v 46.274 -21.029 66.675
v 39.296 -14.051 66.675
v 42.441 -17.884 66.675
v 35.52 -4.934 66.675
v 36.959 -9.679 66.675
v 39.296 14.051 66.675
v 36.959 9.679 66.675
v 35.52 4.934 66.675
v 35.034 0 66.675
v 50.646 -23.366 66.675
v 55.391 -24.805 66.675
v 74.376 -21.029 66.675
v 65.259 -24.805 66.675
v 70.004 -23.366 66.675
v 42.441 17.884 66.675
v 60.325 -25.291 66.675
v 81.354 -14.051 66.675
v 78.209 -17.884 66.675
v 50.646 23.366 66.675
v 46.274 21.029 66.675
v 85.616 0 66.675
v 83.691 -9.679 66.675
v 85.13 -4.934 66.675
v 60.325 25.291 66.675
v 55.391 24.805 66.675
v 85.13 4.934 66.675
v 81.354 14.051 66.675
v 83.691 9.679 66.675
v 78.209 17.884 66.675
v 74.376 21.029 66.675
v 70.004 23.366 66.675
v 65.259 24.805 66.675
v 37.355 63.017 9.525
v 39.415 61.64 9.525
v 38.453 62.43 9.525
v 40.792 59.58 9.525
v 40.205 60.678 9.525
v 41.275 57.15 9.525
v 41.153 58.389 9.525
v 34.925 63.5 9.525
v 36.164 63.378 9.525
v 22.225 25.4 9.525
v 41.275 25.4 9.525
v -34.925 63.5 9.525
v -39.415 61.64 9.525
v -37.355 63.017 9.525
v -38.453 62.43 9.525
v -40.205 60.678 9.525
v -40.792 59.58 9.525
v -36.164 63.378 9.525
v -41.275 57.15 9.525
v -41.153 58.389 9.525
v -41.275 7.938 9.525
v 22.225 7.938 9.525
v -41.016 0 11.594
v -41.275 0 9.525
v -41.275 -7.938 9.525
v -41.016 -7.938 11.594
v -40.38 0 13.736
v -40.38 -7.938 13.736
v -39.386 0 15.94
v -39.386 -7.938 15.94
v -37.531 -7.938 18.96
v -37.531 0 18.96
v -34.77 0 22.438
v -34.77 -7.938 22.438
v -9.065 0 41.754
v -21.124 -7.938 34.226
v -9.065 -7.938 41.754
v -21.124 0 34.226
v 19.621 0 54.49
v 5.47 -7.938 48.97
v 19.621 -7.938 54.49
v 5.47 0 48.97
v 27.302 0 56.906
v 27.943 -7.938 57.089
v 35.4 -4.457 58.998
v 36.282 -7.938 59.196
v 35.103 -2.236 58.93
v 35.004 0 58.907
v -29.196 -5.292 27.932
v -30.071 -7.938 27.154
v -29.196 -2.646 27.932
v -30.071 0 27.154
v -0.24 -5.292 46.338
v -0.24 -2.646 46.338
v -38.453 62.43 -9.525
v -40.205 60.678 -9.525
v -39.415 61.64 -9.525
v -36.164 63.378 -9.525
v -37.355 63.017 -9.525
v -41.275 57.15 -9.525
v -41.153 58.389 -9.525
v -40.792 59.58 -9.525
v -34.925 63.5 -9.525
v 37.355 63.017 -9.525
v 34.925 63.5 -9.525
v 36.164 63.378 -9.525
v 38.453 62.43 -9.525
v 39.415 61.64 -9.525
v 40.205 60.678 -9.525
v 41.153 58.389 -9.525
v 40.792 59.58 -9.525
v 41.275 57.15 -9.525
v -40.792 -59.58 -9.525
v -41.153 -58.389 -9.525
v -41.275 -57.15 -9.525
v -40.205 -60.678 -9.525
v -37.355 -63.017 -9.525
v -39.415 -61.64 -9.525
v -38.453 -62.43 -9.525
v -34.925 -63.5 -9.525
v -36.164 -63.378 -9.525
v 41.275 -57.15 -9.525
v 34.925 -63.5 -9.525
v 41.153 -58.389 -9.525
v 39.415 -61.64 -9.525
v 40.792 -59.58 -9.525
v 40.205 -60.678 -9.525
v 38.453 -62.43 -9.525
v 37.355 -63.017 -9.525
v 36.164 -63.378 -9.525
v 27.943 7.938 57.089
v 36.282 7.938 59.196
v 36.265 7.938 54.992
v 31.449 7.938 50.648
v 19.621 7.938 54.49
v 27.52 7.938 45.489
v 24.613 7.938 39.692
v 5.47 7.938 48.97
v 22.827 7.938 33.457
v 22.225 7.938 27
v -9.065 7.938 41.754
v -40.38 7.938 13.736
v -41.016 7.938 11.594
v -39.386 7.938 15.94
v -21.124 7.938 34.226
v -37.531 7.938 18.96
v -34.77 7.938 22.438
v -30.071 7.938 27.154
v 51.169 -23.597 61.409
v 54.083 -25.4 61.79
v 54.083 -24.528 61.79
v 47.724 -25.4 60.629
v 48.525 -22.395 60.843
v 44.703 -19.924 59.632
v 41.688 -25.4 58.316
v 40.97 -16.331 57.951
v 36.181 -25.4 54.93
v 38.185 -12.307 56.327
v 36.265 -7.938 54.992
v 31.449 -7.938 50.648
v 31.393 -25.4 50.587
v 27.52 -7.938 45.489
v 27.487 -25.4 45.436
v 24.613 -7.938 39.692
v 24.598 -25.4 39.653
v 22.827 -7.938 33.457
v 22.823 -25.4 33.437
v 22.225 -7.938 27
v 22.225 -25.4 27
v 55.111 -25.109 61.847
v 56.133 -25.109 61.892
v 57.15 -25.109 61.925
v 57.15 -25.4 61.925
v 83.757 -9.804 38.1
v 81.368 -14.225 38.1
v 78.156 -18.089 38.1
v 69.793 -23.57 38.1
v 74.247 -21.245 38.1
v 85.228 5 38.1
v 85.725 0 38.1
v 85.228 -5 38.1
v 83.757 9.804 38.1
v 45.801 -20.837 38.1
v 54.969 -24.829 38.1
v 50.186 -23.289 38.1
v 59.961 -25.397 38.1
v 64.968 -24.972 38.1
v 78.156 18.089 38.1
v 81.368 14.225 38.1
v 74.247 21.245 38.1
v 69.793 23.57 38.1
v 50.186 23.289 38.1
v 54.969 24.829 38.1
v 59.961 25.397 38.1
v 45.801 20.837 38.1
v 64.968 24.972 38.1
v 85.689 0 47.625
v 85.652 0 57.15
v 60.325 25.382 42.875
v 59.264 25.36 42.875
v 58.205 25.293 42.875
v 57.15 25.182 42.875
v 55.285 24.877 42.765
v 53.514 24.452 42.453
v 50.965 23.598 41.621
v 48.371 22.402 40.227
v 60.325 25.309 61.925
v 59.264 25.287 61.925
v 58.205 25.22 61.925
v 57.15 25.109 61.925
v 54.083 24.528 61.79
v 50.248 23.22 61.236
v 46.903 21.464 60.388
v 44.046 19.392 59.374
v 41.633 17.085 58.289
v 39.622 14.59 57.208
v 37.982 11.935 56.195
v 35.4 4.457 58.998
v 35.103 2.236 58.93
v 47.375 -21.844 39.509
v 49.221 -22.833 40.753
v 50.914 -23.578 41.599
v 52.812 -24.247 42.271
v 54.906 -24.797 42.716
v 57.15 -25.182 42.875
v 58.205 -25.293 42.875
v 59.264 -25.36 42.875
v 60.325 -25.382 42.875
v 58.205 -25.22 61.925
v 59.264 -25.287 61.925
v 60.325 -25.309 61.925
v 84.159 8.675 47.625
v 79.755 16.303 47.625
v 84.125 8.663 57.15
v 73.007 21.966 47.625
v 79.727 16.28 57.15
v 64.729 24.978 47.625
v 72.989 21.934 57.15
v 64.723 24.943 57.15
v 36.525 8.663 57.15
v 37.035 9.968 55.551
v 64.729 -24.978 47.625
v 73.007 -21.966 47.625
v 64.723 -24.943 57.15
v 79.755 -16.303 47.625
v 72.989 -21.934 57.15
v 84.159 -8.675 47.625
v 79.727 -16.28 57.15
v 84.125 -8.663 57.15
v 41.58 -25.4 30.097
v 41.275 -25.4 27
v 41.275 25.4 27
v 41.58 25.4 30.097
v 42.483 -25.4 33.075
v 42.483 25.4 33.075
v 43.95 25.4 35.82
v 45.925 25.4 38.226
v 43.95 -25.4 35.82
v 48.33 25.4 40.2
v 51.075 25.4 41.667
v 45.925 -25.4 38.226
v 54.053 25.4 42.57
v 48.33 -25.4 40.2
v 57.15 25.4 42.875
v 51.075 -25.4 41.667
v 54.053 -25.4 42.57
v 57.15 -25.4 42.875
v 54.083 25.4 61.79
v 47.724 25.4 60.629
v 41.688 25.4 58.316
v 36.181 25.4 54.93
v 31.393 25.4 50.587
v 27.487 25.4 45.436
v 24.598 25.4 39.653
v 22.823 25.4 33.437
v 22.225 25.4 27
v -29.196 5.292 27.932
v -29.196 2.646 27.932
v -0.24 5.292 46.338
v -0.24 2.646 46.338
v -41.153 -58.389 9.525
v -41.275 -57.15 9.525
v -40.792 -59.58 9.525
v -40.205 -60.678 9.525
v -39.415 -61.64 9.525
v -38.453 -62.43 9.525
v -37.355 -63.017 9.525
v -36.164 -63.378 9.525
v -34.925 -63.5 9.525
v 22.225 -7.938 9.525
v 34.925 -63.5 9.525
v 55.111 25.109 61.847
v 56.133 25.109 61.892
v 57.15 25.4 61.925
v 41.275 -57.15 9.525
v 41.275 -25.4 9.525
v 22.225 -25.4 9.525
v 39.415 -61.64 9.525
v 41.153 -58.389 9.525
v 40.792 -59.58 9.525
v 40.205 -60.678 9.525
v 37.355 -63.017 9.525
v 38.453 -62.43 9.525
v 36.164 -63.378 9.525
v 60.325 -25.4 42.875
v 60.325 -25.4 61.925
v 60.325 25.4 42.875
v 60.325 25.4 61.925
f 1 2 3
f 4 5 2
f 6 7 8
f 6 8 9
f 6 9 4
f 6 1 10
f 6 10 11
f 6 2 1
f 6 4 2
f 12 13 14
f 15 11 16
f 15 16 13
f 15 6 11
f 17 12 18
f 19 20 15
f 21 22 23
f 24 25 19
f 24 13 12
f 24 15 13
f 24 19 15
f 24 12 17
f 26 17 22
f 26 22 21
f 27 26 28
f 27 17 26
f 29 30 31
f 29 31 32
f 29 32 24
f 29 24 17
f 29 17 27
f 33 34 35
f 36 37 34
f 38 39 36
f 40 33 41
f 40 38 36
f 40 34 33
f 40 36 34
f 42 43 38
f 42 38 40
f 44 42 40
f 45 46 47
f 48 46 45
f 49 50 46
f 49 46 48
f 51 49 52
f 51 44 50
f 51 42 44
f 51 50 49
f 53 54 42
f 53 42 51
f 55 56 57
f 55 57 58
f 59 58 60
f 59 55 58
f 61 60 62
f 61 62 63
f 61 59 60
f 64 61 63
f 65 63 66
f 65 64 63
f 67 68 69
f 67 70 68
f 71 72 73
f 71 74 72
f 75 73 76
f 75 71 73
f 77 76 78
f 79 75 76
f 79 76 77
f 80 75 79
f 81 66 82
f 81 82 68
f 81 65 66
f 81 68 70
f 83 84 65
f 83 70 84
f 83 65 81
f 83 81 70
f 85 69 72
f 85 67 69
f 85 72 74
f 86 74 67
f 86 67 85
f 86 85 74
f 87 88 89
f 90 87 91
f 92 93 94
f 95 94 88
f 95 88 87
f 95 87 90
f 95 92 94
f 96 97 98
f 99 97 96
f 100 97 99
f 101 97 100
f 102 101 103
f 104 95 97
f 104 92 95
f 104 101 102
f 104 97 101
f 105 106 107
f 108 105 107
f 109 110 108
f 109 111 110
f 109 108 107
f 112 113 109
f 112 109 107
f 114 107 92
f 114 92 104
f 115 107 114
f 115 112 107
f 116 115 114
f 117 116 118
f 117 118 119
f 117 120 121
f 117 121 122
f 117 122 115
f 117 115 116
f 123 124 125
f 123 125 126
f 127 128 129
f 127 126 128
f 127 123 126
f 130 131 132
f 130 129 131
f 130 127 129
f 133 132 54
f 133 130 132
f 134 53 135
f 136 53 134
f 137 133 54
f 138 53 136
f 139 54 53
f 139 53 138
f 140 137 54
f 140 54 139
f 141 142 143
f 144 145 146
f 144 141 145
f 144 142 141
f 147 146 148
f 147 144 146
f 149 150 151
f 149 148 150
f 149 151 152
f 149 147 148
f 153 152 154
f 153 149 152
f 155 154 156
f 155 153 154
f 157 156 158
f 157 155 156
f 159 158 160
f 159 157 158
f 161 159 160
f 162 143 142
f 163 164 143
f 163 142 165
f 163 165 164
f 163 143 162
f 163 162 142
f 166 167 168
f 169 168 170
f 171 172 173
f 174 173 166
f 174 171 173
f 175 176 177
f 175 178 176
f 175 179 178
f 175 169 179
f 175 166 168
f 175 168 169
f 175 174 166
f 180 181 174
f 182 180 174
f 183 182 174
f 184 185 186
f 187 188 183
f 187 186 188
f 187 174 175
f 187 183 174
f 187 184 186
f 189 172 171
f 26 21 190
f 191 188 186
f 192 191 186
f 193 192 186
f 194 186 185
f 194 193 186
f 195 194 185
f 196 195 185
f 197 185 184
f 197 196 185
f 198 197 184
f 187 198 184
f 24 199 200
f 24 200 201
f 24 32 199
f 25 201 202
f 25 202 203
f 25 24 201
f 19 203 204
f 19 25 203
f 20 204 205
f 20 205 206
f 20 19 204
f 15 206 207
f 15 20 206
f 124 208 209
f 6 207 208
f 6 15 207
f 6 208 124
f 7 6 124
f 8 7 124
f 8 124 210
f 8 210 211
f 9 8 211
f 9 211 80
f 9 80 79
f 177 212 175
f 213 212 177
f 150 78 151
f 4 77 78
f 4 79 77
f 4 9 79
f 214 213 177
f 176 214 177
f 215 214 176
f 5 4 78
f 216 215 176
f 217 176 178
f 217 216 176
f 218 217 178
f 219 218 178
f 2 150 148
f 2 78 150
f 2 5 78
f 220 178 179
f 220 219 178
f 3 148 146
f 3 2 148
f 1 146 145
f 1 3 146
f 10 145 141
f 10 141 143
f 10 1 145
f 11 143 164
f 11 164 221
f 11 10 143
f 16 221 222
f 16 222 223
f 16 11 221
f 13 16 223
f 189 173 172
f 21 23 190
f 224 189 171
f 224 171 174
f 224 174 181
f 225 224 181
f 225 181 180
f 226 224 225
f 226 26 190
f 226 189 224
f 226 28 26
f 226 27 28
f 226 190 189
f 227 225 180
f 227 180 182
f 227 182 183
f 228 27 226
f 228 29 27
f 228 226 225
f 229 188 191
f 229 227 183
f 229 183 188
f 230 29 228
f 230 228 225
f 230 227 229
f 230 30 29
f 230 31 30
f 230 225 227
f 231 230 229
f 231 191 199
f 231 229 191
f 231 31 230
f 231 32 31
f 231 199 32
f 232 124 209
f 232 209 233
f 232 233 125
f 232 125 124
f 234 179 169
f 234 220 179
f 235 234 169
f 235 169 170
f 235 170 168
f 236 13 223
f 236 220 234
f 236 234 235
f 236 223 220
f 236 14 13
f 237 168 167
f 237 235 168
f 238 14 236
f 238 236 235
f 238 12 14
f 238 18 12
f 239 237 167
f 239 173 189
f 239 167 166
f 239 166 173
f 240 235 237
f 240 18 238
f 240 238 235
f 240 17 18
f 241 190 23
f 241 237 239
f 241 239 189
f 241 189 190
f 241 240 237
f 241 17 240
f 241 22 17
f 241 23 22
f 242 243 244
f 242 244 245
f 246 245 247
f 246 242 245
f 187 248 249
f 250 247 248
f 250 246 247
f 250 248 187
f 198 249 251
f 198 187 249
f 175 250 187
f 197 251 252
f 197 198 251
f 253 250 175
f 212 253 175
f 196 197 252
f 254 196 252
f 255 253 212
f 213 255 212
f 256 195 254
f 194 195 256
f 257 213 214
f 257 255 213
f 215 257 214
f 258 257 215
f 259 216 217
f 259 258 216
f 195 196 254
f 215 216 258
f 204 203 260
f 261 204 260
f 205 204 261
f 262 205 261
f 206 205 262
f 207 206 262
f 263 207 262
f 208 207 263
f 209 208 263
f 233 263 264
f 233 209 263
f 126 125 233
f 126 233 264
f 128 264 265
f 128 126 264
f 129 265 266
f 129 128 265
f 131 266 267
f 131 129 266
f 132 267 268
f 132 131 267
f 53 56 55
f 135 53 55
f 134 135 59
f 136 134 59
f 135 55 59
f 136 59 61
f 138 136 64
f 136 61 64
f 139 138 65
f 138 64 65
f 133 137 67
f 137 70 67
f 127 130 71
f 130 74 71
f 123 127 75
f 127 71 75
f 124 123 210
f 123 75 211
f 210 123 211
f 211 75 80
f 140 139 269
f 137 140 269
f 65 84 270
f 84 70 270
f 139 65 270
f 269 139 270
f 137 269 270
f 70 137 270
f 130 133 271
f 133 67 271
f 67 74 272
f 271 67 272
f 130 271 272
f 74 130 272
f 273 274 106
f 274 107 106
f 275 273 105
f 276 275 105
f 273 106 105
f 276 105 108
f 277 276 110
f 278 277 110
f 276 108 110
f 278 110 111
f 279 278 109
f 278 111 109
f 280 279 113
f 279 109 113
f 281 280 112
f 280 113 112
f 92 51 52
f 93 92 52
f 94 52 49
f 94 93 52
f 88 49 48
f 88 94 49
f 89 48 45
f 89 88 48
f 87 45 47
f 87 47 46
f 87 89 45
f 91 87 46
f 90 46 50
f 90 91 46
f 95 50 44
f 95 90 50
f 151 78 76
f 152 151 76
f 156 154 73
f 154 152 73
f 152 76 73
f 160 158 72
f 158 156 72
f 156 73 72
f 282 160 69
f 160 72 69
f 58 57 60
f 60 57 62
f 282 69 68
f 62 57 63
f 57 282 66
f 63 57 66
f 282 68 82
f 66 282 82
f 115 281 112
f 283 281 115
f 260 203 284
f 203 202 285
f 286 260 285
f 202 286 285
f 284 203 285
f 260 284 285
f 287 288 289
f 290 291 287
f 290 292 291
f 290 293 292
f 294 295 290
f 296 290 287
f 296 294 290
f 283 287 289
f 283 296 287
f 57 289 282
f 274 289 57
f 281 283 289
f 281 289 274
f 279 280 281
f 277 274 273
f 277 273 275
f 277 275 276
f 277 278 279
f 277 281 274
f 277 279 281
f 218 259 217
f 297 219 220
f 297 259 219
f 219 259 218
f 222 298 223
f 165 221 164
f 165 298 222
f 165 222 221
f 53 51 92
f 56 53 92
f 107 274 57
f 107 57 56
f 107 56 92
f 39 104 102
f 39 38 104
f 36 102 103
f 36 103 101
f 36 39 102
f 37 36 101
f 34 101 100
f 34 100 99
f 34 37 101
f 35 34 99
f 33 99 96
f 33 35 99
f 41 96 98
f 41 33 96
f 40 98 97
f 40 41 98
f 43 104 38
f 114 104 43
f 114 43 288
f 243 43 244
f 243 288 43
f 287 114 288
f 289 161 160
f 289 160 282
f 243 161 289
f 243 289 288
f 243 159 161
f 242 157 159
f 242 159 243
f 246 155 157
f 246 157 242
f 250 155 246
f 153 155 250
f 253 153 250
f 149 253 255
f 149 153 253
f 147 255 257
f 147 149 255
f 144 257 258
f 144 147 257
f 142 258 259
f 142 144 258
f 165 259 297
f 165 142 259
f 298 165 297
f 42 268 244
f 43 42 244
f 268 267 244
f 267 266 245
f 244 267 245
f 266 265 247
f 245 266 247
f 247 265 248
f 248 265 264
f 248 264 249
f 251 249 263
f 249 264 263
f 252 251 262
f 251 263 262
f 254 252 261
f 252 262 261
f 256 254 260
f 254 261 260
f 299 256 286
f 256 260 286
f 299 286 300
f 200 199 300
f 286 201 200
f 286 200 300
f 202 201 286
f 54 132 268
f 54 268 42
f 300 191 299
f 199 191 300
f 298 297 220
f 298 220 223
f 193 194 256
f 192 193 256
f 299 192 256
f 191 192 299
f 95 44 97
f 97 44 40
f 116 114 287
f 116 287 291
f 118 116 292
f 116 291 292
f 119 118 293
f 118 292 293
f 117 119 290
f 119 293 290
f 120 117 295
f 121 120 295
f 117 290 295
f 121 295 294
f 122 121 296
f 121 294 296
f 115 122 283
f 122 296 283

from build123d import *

# Parameters (mm, degrees)
F1_DEPTH = 63.5
F2_DEPTH = 25.4
F3_DEPTH = 7.9375
F5_R     = 6.35


with BuildPart() as f1:
    # F0 (on Front) → F1 (new body, symmetric)
    with BuildSketch(Plane.XZ):
        Polygon((22.225, 9.525), (-41.275, 9.525), (-41.275, -9.525), (41.275, -9.525), (41.275, 9.525), align=None)
    extrude(amount=F1_DEPTH, both=True)

    # F0 (on Front) → F2 (join, symmetric)
    with BuildSketch(Plane.XZ):
        with BuildLine():
            Line((22.225, 27.0002), (22.225, 9.525))
            Line((22.225, 9.525), (41.275, 9.525))
            Line((41.275, 9.525), (41.275, 27.0002))
            ThreePointArc((41.275, 27.0002), (45.92468, 38.22552), (57.15, 42.8752))
            Line((57.15, 42.8752), (60.325, 42.8752))
            Line((60.325, 42.8752), (60.325, 61.9252))
            Line((60.325, 61.9252), (57.15, 61.9252))
            add(Edge.make_bspline(
                [(54.083062, 61.790278), (55.113813, 61.853181), (56.136476, 61.898364), (57.15, 61.9252)],
                knots=[108.768433, 108.768433, 108.768433, 108.768433, 111.504536, 111.504536, 111.504536, 111.504536], degree=3))
            ThreePointArc((54.083062, 61.790278), (31.392783, 50.586667), (22.225, 27.0002))
        make_face()
    extrude(amount=F2_DEPTH, both=True)

    # F0 (on Front) → F3 (join, symmetric)
    with BuildSketch(Plane.XZ):
        with BuildLine():
            add(Edge.make_bspline(
                [(-41.275, 9.525), (-40.650702, 28.784269), (13.107559, 59.289674), (54.083062, 61.790278)],
                knots=[0, 0, 0, 0, 108.768433, 108.768433, 108.768433, 108.768433], degree=3))
            Line((-41.275, 9.525), (22.225, 9.525))
            Line((22.225, 9.525), (22.225, 27.0002))
            ThreePointArc((22.225, 27.0002), (31.392783, 50.586667), (54.083062, 61.790278))
        make_face()
    extrude(amount=F3_DEPTH, both=True)

    # F0 (on Front) → F4 (revolve)
    with BuildSketch(Plane.XZ):
        Polygon((60.325, 66.675), (60.325, 61.9252), (60.325, 42.8752), (60.325, 38.1), (85.725, 38.1), (85.616186, 66.675), align=None)
    revolve(axis=Axis((60.325, 0, 52.3875), (0, 0, 1)))

    # F5
    f5_edges = [f1.edges().sort_by_distance(p)[0] for p in [
        (41.275, -63.5, 0),
        (-41.275, -63.5, 0),
        (41.275, 63.5, 0),
        (-41.275, 63.5, 0),
    ]]
    fillet(f5_edges, radius=F5_R)


solid = f1.part
